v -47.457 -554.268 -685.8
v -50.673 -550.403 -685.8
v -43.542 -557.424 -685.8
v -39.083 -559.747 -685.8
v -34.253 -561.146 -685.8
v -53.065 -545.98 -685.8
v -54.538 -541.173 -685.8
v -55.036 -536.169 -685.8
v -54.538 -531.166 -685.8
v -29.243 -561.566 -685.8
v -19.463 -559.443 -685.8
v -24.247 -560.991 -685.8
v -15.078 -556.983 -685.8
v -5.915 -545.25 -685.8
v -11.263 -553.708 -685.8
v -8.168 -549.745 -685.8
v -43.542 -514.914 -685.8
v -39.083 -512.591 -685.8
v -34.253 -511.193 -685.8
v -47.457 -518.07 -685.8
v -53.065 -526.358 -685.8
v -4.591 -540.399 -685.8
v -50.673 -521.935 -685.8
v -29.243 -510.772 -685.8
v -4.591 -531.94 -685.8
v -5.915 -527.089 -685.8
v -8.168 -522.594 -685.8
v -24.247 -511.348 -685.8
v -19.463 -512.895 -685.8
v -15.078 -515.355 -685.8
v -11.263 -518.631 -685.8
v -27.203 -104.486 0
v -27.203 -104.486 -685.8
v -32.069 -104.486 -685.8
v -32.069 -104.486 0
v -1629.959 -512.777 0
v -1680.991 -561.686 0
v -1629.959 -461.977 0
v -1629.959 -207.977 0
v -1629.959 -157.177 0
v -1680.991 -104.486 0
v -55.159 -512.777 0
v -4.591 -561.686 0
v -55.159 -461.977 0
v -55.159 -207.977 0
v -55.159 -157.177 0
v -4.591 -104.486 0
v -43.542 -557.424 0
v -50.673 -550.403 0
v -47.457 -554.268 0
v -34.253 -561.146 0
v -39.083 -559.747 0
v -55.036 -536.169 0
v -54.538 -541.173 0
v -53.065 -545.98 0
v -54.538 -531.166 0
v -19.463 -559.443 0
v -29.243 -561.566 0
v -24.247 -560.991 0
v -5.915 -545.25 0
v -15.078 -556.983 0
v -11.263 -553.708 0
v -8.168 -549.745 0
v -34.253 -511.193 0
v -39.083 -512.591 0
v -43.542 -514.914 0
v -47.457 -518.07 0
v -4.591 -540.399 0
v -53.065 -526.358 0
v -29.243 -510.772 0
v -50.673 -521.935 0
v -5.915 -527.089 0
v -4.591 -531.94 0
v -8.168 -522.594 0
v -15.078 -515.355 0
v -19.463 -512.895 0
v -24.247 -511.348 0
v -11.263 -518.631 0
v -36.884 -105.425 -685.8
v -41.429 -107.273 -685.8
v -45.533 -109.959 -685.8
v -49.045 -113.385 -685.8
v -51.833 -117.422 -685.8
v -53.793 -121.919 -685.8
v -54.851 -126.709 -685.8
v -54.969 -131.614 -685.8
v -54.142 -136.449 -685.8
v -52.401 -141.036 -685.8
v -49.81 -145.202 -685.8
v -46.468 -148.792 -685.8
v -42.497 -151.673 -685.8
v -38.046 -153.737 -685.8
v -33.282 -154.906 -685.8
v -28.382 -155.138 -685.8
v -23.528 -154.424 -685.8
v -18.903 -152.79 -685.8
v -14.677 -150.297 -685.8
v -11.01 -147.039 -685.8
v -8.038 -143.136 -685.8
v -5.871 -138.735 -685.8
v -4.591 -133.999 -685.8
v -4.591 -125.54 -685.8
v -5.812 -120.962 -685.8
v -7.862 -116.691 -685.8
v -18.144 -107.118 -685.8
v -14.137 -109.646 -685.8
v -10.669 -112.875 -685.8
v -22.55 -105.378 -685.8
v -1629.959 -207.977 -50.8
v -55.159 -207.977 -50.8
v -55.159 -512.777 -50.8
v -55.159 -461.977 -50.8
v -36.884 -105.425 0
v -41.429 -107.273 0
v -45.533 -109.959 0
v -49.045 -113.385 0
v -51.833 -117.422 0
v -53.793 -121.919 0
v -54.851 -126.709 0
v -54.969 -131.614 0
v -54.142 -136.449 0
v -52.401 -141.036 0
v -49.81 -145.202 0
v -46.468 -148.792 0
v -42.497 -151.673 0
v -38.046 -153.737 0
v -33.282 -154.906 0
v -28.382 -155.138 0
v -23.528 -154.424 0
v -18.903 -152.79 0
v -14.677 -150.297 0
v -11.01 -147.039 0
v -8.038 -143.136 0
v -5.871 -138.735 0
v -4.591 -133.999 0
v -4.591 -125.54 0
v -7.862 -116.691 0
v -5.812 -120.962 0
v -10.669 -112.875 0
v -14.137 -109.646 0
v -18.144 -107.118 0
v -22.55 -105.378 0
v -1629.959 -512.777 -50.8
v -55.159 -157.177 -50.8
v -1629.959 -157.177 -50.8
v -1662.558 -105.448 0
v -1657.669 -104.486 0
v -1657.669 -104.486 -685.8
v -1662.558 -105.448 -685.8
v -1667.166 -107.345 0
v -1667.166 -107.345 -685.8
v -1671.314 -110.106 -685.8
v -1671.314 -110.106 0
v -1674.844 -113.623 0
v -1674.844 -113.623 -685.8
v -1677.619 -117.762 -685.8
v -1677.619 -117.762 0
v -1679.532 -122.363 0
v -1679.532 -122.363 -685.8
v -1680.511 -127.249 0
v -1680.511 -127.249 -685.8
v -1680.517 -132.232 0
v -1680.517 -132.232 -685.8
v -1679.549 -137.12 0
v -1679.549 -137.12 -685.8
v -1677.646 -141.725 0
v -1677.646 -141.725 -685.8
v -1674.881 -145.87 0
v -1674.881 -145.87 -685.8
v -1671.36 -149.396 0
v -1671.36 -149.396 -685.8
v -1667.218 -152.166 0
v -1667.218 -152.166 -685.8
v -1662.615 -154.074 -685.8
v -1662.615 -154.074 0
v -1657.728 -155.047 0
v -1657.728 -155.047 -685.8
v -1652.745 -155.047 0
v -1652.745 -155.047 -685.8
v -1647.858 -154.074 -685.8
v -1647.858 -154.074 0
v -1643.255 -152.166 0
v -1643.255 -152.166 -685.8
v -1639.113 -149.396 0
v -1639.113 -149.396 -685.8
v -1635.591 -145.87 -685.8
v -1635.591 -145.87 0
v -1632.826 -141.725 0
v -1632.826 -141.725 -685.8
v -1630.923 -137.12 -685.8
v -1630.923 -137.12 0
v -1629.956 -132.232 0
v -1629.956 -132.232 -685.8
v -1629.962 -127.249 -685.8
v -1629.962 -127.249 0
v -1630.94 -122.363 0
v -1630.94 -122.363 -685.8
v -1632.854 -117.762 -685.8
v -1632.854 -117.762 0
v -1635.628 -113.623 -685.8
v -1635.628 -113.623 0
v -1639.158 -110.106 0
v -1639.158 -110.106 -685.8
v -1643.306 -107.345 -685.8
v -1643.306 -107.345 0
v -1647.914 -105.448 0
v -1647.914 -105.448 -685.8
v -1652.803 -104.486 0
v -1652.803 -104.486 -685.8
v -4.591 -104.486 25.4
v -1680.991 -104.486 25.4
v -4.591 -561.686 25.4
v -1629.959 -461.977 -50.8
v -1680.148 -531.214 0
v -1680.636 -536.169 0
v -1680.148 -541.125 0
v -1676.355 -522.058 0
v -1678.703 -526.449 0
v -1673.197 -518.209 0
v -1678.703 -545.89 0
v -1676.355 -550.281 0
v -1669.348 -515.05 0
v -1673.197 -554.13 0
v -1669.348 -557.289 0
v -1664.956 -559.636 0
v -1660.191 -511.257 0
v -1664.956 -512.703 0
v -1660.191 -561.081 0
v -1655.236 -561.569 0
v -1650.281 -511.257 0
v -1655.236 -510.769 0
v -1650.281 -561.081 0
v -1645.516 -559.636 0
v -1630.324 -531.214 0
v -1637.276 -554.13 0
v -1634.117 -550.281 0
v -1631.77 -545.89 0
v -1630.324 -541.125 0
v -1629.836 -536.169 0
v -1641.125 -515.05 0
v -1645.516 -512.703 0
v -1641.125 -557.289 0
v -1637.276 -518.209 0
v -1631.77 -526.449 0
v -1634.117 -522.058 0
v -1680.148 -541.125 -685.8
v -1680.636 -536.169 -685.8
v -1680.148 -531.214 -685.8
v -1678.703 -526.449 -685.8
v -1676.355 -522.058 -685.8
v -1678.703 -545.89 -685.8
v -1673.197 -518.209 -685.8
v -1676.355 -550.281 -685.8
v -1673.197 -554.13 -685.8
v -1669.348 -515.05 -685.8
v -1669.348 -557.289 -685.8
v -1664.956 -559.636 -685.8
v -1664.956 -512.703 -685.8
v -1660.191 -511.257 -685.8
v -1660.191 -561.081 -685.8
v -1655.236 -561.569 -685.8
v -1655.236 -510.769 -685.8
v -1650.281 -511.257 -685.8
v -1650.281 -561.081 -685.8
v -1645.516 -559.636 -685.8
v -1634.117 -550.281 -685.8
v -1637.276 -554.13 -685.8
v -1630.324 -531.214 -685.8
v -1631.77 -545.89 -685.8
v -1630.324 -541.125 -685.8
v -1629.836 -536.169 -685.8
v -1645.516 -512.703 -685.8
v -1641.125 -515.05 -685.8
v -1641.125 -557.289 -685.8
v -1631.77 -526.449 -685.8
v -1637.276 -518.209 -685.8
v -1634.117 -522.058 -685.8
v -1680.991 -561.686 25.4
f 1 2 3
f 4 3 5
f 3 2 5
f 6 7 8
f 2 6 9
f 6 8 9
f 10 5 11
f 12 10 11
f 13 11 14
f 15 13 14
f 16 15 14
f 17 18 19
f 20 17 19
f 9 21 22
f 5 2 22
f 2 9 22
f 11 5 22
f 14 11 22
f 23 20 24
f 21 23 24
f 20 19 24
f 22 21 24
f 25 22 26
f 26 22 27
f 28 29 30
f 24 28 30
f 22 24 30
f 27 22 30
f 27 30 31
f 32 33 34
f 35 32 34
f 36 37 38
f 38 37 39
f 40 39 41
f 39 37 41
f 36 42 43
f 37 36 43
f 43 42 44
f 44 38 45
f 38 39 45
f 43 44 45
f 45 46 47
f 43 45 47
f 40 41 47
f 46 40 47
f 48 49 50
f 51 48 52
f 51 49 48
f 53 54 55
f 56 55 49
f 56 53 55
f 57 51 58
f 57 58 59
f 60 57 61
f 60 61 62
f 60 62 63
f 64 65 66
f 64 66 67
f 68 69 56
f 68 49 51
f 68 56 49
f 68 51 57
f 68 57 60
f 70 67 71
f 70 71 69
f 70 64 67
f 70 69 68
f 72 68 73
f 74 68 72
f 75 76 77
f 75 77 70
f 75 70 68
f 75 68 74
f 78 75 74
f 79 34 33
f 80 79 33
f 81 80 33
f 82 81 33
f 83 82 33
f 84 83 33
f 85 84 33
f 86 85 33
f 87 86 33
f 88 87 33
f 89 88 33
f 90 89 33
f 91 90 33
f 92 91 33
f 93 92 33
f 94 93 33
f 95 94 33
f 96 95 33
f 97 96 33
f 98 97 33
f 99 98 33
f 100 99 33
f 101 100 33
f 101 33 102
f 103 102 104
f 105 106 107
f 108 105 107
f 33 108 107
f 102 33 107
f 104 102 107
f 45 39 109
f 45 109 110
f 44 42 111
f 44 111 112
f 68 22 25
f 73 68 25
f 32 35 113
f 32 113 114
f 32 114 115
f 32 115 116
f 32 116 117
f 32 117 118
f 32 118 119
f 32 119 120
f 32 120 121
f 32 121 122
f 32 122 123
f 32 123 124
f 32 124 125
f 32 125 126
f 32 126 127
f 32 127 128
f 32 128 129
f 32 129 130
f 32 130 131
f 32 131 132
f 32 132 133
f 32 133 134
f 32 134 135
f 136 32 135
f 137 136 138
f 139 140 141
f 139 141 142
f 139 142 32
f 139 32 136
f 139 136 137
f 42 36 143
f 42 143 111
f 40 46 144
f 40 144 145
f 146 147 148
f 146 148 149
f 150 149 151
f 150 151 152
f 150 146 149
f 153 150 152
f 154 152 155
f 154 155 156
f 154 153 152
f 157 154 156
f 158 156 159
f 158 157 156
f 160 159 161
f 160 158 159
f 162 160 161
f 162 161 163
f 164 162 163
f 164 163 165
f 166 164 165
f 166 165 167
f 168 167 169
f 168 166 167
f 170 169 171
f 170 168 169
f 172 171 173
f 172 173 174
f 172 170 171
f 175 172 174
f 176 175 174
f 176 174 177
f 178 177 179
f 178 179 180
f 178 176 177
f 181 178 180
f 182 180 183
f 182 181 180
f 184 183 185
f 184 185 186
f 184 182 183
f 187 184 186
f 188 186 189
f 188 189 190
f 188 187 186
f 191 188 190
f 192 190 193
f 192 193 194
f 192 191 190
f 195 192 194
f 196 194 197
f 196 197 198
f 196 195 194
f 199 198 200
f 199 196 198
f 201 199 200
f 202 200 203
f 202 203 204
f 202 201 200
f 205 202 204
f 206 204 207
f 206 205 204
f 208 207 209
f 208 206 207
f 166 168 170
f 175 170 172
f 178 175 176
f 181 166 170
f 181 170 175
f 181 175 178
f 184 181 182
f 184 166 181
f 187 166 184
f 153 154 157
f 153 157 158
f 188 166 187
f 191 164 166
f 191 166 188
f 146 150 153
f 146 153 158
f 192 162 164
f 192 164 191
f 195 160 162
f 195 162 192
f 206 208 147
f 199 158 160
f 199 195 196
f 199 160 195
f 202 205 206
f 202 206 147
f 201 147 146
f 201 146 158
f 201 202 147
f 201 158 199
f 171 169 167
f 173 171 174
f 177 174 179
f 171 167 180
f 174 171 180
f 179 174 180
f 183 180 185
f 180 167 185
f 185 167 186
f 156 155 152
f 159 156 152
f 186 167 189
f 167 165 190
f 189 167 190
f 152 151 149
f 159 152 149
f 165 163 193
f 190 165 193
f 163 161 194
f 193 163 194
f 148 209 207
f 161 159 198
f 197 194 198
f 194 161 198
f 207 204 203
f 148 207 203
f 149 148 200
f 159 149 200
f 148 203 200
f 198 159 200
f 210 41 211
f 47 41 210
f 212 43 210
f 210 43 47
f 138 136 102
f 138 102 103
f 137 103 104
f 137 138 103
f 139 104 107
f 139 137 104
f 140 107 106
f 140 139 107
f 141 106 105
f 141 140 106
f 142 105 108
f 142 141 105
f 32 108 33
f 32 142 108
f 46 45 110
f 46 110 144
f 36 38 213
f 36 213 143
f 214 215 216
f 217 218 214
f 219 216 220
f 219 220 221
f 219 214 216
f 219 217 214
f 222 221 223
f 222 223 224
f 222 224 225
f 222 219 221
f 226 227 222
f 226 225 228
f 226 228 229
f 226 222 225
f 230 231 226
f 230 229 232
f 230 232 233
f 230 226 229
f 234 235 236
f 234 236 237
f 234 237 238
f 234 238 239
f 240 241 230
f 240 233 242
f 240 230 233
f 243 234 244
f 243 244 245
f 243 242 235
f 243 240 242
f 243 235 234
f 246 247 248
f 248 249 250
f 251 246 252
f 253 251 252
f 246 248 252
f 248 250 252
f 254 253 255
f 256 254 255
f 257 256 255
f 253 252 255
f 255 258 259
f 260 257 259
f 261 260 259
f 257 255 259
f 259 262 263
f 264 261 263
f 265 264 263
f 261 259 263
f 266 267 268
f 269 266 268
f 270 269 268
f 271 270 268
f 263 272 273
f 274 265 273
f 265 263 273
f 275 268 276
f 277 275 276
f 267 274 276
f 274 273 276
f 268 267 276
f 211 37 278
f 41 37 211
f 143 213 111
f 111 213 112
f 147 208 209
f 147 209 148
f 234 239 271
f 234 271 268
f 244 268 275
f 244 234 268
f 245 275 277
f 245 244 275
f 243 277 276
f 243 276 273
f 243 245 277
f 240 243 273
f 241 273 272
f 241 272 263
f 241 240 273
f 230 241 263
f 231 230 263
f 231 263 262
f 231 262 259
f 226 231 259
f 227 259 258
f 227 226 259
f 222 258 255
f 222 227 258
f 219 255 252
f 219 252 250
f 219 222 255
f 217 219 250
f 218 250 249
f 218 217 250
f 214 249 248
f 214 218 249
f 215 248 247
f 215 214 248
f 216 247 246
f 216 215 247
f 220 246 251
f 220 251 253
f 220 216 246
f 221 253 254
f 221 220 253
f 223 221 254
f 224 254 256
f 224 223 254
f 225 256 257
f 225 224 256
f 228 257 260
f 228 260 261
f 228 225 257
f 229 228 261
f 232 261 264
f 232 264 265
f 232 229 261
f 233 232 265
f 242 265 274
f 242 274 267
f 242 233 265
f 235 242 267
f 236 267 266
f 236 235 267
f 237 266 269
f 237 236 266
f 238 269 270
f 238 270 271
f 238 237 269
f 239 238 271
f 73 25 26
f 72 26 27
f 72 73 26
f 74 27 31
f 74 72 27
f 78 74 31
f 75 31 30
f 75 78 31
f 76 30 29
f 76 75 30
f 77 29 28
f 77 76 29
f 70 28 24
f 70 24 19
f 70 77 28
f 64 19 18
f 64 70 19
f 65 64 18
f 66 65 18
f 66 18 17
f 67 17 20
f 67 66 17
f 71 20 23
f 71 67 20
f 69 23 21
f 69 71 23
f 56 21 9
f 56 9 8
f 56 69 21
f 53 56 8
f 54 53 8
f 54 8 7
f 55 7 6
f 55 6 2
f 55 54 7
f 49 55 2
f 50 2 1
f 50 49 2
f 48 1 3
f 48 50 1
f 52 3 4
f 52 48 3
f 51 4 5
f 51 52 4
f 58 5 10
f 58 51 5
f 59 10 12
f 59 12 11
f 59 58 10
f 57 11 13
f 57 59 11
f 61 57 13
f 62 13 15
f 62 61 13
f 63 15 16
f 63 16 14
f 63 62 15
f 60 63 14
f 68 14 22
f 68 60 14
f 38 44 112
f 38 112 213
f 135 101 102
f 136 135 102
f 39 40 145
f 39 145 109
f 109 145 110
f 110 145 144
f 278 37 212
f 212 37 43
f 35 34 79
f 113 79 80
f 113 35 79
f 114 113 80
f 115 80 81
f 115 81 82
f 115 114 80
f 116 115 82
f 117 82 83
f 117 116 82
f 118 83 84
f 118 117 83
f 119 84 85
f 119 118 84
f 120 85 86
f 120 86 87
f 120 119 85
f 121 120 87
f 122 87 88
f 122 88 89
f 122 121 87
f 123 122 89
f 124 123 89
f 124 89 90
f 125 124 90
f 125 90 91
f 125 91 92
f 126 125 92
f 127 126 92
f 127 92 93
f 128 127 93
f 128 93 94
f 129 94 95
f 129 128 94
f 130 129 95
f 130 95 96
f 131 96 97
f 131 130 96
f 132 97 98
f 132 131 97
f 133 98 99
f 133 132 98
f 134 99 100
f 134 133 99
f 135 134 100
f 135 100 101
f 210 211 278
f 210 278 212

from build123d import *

# Parameters (mm, degrees)
F0_W     = 1676.4
F0_H     = 457.2
F1_DEPTH = 25.4
F2_R     = 25.4
F3_DEPTH = 685.8
F5_DEPTH = 50.8


with BuildPart() as f1:
    # F0 (on Top) → F1 (new body)
    with BuildSketch(Plane.XY):
        with Locations((-842.7907367021, -333.0861411702)):
            Rectangle(F0_W, F0_H)
    extrude(amount=F1_DEPTH)

    # F4 (on face) → F5 (join)
    with BuildSketch(Plane.XY):
        Polygon((-1629.9590991974, -461.9765826102), (-1629.9590991974, -512.7765826102), (-1604.5590991974, -512.7765826102), (-1579.1590991974, -512.7765826102), (-55.1590991974, -512.7765826102), (-55.1590991974, -461.9765826102), (-1579.1590991974, -461.9765826102), (-1604.5590991974, -461.9765826102), align=None)
        Polygon((-1579.1590991974, -207.9765826102), (-55.1590991974, -207.9765826102), (-55.1590991974, -157.1765826102), (-1579.1590991974, -157.1765826102), (-1604.5590991974, -157.1765826102), (-1629.9590991974, -157.1765826102), (-1629.9590991974, -207.9765826102), (-1604.5590991974, -207.9765826102), align=None)
    extrude(amount=-F5_DEPTH)


with BuildPart() as f3:
    # F2 (on face) → F3 (new body)
    with BuildSketch(Plane.XY):
        with Locations((-1655.2361249924, -536.1693501472)):
            Circle(F2_R)
    extrude(amount=-F3_DEPTH)


with BuildPart() as f3b:
    # F2 (on face) → F3, piece 2 (new body)
    with BuildSketch(Plane.XY):
        with BuildLine():
            ThreePointArc((-1657.6690951571, -104.4861411702), (-1672.3148040662, -148.5703799353), (-1629.8361249924, -129.7693501472))
            ThreePointArc((-1629.8361249924, -129.7693501472), (-1636.4350952043, -112.6906710734), (-1652.8031548277, -104.4861411702))
            Line((-1652.8031548277, -104.4861411702), (-1657.6690951571, -104.4861411702))
        make_face()
    extrude(amount=-F3_DEPTH)


with BuildPart() as f3c:
    # F2 (on face) → F3, piece 3 (new body)
    with BuildSketch(Plane.XY):
        with BuildLine():
            Line((-27.2031548277, -104.4861411702), (-32.0690951571, -104.4861411702))
            ThreePointArc((-32.0690951571, -104.4861411702), (-48.2259100492, -147.0777264877), (-4.5907367021, -133.9988330221))
            Line((-4.5907367021, -133.9988330221), (-4.5907367021, -125.5398672724))
            ThreePointArc((-4.5907367021, -125.5398672724), (-12.3277486519, -111.1795650904), (-27.2031548277, -104.4861411702))
        make_face()
    extrude(amount=-F3_DEPTH)


with BuildPart() as f3d:
    # F2 (on face) → F3, piece 4 (new body)
    with BuildSketch(Plane.XY):
        with BuildLine():
            Line((-4.5907367021, -540.3988330221), (-4.5907367021, -531.9398672724))
            ThreePointArc((-4.5907367021, -531.9398672724), (-55.0361249924, -536.1693501472), (-4.5907367021, -540.3988330221))
        make_face()
    extrude(amount=-F3_DEPTH)


solid = Compound([f1.part, f3.part, f3b.part, f3c.part, f3d.part])
